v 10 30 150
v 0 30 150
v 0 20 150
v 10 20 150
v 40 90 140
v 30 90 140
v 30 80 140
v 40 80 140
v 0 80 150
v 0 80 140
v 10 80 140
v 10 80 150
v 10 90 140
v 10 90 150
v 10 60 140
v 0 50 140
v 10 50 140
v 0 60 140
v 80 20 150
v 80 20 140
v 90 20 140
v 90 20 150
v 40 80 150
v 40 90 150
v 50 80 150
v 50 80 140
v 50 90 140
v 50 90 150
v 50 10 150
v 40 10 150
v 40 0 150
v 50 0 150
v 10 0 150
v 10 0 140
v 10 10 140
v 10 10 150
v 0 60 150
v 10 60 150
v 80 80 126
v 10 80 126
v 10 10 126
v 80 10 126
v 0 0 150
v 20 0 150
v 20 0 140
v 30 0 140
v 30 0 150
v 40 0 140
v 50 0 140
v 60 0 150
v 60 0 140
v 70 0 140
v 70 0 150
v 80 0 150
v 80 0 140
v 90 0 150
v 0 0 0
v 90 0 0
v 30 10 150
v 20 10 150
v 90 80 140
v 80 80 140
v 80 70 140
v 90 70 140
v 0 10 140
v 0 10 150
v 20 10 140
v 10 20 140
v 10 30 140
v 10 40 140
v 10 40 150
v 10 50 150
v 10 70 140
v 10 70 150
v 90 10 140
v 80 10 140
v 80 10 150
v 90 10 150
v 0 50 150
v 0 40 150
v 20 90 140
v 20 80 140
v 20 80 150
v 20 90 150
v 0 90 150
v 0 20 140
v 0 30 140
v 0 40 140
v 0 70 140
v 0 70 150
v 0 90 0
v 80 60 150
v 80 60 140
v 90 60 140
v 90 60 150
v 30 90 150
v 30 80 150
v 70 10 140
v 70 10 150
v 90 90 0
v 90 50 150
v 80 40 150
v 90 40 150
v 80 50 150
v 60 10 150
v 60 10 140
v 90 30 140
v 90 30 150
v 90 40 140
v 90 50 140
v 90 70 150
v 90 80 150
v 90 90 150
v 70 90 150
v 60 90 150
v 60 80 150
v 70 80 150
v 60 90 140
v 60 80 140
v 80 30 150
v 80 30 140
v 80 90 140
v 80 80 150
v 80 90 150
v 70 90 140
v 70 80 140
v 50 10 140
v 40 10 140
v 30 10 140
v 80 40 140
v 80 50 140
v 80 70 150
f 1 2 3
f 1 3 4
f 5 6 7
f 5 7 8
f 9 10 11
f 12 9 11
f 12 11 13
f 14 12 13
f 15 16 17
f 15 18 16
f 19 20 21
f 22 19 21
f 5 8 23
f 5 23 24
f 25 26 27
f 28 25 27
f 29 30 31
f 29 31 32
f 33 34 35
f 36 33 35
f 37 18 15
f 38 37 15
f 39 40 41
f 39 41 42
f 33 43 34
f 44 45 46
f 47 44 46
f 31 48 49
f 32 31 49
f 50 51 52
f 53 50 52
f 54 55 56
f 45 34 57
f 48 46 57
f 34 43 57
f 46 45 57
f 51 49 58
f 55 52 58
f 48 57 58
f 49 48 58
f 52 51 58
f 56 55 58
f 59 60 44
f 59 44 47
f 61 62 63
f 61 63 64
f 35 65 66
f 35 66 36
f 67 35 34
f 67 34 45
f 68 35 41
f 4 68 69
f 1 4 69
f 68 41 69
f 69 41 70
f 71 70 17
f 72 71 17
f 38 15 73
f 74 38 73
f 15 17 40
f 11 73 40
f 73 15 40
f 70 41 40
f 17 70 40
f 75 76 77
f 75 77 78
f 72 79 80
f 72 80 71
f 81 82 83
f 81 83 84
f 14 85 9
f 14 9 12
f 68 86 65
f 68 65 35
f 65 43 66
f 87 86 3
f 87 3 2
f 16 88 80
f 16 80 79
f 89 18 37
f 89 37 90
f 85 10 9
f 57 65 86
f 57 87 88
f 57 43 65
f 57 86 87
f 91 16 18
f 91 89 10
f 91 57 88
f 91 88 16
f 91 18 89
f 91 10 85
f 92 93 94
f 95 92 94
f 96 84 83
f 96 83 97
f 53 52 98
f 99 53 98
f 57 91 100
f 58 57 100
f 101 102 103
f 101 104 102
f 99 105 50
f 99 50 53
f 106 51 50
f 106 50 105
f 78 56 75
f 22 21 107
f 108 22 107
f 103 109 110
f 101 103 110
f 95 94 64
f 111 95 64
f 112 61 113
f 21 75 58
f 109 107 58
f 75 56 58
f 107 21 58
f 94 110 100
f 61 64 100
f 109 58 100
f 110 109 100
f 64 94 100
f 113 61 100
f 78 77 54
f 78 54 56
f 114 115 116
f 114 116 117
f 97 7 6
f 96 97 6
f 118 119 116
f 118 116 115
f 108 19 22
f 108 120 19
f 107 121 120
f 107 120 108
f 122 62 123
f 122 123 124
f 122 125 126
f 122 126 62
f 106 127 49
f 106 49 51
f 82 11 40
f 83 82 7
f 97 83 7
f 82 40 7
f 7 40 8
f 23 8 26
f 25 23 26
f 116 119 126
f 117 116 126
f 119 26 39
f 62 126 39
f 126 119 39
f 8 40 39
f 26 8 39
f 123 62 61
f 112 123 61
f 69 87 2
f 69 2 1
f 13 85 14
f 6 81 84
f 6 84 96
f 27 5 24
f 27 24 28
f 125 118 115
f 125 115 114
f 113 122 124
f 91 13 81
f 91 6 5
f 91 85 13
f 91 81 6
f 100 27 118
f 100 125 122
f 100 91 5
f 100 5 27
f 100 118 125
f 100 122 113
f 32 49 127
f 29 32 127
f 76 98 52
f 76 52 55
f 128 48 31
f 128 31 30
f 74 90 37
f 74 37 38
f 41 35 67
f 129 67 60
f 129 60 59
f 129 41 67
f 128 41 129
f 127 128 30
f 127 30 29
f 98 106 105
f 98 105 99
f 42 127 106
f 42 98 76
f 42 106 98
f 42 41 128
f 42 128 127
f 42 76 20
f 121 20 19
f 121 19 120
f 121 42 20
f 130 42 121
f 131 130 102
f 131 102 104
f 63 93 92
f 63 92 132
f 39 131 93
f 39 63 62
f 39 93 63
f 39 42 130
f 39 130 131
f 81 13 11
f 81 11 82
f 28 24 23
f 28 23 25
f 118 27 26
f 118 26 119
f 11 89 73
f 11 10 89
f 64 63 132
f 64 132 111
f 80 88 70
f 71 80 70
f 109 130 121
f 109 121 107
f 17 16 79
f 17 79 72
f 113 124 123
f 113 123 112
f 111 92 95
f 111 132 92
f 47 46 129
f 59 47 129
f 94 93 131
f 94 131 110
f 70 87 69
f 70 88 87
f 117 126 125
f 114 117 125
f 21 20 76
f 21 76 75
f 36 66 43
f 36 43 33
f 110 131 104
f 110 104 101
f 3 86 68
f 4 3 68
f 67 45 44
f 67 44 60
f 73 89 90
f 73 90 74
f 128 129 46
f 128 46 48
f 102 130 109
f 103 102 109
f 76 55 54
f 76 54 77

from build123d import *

# Parameters (mm, degrees)
BOX003_W      = 70
BOX003_H      = 70
BOX003_DEPTH  = 25
BOX001_W      = 10
BOX001_H      = 10
BOX001_DEPTH  = 10
ARRAY_X_COUNT = 5
ARRAY_X_PITCH = 20
ARRAY_Y_COUNT = 5
ARRAY_Y_PITCH = 20
BOX002_W      = 90
BOX002_H      = 90
BOX002_DEPTH  = 10
BOX_W         = 90
BOX_H         = 90
BOX_DEPTH     = 150


with BuildPart() as cub003:
    # Box003 → Box003 (new body)
    with BuildSketch(Plane(origin=(10, 10, 126), x_dir=(1, 0, 0), z_dir=(0, 0, 1))):
        with Locations((35, 35)):
            Rectangle(BOX003_W, BOX003_H)
    extrude(amount=BOX003_DEPTH)


with BuildPart() as array:
    # Box001 → Box001 (new body)
    with BuildSketch(Plane.XY):
        with Locations((5, 5)):
            Rectangle(BOX001_W, BOX001_H)
    extrude(amount=BOX001_DEPTH)

    # Array X: Array ×5


with BuildPart() as array_1:
    add(array.part)
    with Locations(*[(i * ARRAY_X_PITCH, 0, 0) for i in range(1, ARRAY_X_COUNT)]):
        add(array.part)

    # Array Y: Array ×5


with BuildPart() as array_2:
    add(array_1.part)
    with Locations(*[(0, i * ARRAY_Y_PITCH, 0) for i in range(1, ARRAY_Y_COUNT)]):
        add(array_1.part)


with BuildPart() as cut:
    # Box002 → Box002 (new body)
    with BuildSketch(Plane.XY):
        with Locations((45, 45)):
            Rectangle(BOX002_W, BOX002_H)
    extrude(amount=BOX002_DEPTH)

    # Cut: cut Array
    add(array_2.part, mode=Mode.SUBTRACT)


with BuildPart() as cut_1:
    # Cut placement: moved
    add(cut.part.moved(Location((0, 0, 140))))


with BuildPart() as cut002:
    # Box → Box (new body)
    with BuildSketch(Plane.XY):
        with Locations((45, 45)):
            Rectangle(BOX_W, BOX_H)
    extrude(amount=BOX_DEPTH)

    # Cut001: cut Cut
    add(cut_1.part, mode=Mode.SUBTRACT)

    # Cut002: cut Cub003
    add(cub003.part, mode=Mode.SUBTRACT)


solid = cut002.part
